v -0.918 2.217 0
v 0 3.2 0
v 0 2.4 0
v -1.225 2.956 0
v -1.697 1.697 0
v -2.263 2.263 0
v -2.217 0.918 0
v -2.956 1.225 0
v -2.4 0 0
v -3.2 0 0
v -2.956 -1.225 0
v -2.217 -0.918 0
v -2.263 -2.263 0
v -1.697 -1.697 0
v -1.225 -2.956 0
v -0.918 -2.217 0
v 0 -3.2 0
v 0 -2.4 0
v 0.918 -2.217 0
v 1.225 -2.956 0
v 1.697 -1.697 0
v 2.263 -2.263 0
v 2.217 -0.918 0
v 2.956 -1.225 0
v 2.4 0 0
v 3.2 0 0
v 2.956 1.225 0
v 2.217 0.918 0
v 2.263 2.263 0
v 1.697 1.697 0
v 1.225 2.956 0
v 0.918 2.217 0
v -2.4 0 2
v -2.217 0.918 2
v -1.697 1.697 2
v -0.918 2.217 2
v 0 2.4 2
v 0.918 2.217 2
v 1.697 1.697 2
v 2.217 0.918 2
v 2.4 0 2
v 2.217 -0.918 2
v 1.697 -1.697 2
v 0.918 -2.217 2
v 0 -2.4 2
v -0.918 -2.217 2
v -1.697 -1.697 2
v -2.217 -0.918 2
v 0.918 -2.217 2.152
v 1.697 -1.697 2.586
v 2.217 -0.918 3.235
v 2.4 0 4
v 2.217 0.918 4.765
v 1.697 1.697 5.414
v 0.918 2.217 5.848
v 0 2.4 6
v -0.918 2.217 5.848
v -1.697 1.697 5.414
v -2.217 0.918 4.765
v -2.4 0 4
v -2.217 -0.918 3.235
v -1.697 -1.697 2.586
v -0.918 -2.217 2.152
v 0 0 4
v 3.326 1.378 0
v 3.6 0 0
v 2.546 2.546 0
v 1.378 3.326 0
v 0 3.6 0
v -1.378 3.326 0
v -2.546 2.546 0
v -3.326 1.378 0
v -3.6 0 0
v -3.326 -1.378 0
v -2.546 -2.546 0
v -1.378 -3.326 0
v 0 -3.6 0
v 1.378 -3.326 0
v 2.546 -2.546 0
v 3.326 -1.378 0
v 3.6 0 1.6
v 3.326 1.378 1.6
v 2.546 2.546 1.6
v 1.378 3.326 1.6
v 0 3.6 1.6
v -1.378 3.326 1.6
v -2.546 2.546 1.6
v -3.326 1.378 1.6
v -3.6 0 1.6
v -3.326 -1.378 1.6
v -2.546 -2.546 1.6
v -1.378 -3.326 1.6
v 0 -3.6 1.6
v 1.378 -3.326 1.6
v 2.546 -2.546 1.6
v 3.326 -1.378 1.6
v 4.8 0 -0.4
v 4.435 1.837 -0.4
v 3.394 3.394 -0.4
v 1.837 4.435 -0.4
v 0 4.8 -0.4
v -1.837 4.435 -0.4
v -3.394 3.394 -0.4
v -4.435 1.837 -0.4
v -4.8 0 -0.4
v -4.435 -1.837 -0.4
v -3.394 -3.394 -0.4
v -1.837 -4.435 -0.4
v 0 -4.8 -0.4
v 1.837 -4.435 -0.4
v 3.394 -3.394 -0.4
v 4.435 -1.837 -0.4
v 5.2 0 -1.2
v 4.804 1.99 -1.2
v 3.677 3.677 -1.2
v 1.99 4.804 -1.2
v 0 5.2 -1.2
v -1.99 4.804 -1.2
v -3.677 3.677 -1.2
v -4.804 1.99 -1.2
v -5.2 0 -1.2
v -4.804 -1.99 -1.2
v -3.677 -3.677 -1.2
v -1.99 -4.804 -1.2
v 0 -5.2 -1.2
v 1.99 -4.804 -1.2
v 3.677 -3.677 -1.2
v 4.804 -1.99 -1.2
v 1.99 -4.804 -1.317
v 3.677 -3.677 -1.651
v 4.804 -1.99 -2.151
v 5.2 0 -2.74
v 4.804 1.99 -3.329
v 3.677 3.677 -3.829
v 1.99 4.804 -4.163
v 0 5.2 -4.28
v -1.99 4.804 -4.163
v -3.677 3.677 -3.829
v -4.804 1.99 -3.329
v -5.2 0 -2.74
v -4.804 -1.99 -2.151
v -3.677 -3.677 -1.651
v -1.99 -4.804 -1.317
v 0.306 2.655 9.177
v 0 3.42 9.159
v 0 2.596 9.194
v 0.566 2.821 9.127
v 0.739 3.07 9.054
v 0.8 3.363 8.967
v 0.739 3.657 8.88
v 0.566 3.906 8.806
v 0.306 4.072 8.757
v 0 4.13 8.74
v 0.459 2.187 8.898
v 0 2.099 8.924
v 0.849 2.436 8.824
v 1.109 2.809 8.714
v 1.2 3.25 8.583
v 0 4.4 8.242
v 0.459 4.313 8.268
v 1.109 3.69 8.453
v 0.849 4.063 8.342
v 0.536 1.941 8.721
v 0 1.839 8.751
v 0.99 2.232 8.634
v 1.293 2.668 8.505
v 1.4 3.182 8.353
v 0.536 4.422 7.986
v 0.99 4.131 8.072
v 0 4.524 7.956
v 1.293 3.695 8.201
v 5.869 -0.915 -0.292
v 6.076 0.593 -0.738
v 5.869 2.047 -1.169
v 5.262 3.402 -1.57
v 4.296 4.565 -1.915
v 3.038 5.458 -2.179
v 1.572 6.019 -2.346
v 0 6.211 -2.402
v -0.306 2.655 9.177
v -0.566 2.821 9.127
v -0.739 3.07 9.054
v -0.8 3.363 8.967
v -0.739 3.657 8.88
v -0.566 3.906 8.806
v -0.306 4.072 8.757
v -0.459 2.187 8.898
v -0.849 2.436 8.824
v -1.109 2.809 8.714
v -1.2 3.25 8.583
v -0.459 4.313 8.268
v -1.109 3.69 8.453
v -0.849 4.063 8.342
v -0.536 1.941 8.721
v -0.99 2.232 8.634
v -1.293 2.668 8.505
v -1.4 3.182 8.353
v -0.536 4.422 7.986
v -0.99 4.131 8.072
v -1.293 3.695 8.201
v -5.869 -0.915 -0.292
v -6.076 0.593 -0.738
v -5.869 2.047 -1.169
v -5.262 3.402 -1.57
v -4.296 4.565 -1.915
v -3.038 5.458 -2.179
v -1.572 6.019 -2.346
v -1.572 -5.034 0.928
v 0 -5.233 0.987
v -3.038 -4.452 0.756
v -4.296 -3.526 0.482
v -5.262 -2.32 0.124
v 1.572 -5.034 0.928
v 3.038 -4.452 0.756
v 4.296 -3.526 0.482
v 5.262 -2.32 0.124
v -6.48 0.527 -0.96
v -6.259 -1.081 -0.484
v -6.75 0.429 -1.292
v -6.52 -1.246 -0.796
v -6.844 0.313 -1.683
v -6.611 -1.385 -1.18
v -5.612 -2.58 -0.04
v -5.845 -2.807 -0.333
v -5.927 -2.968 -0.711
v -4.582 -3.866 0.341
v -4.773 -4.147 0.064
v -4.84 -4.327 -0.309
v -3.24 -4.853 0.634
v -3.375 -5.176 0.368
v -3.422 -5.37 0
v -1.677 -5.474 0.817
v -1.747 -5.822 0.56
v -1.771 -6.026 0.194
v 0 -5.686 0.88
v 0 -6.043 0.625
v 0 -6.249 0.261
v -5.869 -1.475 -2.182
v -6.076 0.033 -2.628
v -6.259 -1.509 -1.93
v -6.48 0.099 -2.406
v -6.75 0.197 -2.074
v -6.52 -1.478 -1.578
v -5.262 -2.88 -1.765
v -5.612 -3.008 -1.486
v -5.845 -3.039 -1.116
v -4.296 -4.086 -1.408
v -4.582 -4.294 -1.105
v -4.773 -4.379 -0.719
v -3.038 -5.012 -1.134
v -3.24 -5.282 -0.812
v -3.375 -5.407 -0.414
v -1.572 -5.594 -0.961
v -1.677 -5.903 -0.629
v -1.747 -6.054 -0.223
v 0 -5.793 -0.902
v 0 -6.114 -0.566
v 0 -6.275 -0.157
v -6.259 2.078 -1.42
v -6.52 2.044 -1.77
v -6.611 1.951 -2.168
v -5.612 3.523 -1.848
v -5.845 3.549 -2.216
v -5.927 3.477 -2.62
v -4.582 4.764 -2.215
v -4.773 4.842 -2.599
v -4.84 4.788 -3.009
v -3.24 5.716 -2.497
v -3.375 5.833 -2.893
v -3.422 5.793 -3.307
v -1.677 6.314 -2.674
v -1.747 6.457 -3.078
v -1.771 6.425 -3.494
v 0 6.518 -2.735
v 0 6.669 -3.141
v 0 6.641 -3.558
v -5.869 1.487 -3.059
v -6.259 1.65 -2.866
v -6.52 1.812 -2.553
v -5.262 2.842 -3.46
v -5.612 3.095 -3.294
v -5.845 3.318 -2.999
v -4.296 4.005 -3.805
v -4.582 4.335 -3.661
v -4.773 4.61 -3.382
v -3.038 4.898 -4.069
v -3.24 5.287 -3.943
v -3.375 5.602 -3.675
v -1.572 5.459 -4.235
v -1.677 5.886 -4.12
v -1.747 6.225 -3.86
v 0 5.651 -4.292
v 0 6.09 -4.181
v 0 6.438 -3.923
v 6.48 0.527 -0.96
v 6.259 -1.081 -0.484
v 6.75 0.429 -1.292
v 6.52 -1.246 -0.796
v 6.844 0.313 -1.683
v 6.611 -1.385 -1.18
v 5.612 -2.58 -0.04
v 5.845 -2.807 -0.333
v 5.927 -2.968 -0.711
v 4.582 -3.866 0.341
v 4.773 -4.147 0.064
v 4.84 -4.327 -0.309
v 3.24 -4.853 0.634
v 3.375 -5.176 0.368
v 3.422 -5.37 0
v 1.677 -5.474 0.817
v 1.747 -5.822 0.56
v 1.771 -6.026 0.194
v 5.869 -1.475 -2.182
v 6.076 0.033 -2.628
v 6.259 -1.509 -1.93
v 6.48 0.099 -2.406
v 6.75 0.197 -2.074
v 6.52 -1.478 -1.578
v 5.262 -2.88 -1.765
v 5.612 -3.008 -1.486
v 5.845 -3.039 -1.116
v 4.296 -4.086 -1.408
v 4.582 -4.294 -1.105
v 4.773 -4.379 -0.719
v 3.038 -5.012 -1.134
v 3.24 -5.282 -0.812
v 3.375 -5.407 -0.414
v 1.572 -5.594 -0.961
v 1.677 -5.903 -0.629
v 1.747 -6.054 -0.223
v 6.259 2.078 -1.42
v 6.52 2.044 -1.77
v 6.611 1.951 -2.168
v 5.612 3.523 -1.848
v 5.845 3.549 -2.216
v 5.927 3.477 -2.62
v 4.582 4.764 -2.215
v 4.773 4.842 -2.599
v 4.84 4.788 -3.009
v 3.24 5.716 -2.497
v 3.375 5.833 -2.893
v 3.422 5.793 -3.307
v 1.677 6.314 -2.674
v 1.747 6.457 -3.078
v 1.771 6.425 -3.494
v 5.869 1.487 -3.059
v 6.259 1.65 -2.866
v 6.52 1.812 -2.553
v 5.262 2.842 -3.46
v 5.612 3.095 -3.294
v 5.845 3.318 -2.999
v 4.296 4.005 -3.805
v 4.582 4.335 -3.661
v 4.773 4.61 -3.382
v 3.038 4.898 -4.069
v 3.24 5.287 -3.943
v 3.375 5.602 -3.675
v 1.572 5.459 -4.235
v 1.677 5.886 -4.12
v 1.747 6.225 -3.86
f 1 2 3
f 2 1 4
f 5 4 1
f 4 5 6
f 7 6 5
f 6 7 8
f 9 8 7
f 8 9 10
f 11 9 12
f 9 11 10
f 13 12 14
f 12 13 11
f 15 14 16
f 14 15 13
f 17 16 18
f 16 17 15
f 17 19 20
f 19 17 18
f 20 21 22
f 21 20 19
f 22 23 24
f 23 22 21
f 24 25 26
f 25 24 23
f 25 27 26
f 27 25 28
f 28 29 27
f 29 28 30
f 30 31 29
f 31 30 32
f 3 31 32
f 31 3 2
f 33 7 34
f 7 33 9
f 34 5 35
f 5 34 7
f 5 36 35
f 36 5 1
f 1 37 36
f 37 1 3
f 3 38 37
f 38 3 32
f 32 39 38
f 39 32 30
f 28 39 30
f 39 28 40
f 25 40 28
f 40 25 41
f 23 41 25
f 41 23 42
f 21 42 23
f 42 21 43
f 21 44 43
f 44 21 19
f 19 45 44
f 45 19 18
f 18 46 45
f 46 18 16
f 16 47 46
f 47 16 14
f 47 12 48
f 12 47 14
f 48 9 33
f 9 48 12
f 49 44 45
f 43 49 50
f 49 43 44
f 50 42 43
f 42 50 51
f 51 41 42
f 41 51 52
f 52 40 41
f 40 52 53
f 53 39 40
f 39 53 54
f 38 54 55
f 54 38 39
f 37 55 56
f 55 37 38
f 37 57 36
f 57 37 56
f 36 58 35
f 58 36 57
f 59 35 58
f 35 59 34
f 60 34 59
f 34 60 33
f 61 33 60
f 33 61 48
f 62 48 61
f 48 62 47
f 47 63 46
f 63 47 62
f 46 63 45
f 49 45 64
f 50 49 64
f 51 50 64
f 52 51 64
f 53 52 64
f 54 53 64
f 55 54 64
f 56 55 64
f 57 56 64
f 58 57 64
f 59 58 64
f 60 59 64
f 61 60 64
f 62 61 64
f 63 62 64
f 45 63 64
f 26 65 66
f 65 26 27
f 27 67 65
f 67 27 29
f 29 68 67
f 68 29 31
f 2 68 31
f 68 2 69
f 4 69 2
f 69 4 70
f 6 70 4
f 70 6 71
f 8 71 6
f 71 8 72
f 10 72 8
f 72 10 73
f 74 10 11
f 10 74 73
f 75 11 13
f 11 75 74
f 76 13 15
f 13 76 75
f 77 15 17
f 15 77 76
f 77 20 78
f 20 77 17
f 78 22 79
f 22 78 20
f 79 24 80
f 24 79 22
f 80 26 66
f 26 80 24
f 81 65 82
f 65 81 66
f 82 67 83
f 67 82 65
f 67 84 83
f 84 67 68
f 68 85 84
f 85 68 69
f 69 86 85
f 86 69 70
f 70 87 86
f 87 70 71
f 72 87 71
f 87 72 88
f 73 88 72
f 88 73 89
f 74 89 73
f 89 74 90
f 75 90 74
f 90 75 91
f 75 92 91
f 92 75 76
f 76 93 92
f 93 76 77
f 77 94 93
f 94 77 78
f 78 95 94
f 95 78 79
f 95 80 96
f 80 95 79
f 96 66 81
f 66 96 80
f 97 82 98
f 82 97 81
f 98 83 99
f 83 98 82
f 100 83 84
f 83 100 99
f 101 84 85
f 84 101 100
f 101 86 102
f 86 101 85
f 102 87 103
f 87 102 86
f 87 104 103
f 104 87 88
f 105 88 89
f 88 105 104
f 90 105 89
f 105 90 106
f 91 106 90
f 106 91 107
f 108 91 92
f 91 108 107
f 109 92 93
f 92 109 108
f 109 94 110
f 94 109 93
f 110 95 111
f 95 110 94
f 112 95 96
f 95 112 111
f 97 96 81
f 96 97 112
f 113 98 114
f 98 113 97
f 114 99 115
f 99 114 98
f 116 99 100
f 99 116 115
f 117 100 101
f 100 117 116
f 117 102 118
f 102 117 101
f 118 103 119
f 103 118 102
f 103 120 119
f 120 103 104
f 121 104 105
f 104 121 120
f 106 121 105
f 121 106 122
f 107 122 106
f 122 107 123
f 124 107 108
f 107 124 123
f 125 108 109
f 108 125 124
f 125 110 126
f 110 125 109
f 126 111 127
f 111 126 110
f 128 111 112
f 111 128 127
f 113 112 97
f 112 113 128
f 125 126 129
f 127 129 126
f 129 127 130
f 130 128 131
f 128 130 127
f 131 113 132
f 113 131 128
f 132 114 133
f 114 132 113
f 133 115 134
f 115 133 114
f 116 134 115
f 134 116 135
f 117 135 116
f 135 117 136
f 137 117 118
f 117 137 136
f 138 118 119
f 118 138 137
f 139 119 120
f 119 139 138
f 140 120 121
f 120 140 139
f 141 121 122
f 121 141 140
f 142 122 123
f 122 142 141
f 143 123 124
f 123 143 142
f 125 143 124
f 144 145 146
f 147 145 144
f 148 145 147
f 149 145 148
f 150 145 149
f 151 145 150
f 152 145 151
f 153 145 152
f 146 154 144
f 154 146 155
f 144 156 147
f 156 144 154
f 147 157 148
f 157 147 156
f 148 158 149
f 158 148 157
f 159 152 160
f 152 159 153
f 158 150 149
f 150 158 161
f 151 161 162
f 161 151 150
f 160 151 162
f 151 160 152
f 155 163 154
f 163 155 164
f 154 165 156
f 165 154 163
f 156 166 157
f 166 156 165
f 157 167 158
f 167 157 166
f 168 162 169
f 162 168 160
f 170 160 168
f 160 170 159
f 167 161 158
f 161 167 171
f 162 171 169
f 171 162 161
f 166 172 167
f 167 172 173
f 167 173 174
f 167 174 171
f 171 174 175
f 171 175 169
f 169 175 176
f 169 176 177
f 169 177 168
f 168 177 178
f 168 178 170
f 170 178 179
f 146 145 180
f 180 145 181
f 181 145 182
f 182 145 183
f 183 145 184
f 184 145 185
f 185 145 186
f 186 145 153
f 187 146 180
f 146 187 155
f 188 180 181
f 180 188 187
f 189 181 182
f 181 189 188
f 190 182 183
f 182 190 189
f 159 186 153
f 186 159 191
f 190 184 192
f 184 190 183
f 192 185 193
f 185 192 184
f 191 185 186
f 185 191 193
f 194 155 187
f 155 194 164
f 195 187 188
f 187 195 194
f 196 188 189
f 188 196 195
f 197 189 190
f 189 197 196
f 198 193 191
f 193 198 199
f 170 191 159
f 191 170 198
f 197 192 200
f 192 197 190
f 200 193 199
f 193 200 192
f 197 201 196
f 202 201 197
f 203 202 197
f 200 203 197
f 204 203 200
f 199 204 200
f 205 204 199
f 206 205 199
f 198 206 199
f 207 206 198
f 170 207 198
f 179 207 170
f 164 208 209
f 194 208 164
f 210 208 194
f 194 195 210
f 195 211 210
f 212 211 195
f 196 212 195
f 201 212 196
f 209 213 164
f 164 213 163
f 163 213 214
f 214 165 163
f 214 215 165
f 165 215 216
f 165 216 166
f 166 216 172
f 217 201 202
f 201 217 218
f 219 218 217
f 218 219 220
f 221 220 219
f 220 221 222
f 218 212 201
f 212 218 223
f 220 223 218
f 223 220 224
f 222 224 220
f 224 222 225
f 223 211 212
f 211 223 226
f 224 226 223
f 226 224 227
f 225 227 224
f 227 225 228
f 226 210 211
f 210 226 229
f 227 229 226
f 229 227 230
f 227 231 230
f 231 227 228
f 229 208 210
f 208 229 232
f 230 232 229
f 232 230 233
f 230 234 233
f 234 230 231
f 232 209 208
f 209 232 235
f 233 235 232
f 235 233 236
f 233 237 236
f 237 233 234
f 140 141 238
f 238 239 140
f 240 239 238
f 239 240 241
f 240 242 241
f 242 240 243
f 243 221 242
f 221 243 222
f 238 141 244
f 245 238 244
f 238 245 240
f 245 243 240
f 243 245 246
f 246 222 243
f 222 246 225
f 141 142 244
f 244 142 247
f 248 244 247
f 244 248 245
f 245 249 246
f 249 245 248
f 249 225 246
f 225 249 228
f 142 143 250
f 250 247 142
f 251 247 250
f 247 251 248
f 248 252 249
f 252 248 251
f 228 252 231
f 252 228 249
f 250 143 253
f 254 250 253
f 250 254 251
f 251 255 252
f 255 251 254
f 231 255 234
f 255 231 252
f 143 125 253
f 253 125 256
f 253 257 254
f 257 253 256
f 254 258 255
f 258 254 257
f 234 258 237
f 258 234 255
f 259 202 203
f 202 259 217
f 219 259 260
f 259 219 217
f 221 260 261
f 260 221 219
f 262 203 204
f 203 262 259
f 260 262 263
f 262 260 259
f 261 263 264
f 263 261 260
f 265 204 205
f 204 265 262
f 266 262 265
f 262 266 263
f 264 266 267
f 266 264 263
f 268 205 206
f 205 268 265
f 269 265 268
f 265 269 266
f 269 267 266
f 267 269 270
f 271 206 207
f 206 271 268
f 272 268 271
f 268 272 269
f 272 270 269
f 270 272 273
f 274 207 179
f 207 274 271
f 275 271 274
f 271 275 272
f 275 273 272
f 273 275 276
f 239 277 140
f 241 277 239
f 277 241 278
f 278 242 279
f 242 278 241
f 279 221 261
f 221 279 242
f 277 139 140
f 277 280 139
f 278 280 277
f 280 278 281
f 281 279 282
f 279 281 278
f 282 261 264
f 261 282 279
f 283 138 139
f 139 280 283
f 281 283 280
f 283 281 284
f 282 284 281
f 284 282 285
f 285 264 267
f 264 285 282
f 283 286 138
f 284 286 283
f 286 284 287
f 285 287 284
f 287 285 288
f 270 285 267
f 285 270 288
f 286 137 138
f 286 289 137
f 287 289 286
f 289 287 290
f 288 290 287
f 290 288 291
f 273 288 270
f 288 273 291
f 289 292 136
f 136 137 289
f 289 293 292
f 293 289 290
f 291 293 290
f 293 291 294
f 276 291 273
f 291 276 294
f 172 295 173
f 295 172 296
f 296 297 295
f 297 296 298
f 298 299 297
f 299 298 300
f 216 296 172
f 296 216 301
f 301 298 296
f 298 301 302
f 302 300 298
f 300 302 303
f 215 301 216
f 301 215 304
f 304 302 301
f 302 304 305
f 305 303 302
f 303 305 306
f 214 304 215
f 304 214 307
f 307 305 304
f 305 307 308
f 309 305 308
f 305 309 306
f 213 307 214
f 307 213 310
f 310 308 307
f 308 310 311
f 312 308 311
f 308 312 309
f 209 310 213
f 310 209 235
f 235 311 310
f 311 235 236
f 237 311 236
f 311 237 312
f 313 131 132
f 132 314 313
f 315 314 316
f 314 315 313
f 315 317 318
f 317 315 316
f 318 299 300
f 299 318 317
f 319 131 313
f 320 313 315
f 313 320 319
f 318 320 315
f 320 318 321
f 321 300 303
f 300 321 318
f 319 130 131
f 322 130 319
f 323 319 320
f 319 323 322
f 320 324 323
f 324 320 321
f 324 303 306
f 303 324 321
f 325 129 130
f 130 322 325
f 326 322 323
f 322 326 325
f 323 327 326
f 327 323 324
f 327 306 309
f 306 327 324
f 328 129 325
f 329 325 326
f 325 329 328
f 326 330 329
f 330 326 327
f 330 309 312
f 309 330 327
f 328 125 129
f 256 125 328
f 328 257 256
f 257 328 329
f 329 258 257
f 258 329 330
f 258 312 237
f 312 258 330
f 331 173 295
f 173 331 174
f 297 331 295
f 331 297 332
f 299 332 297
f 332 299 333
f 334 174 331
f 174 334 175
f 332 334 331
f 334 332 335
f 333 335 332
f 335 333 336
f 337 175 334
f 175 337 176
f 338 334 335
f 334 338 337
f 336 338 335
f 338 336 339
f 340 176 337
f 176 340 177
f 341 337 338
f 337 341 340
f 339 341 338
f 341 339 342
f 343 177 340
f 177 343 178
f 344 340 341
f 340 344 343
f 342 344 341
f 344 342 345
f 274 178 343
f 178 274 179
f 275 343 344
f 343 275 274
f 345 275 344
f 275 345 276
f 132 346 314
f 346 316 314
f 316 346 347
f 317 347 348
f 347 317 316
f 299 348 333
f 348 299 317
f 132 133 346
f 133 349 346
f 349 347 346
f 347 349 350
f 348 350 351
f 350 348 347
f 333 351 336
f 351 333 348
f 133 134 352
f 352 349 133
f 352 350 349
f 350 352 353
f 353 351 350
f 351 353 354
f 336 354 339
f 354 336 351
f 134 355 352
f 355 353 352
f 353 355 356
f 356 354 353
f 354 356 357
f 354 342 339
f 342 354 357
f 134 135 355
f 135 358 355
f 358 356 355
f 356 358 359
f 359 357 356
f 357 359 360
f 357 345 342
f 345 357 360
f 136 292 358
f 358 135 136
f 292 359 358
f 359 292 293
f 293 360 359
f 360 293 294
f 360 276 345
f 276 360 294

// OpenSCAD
use <../lib.scad>
use <s/12894s01.scad>
use <s/12894s03.scad>
use <s/12894s04.scad>
function ldraw_lib__12894() = [
// 0 Minifig Hat Cone
// 0 Name: 12894.dat
// 0 Author: Gerald Lasser [GeraldLasser]
// 0 !LDRAW_ORG Part UPDATE 2026-01
// 0 !LICENSE Licensed under CC BY 4.0 : see CAreadme.txt
// 
// 0 BFC CERTIFY CCW
  [0,"BFC","CERTIFY"],
  [0,"BFC","CCW"],
// 
// 0 !CATEGORY Minifig Headwear
// 
// 0 !HISTORY 2013-08-14 {LEGO Digital Designer} Original part shape
// 0 !HISTORY 2023-12-27 [GeraldLasser] File preparation for LDraw Parts Tracker
// 0 !HISTORY 2026-01-29 [OrionP] Official Update 2026-01
// 
// 1 16 0 0 0 1 0 0 0 1 0 0 0 1 s\12894s01.dat
  [1,16,0,0,0,1,0,0,0,1,0,0,0,1, ldraw_lib__s__12894s01()],
// 
// 1 16 0 0 0 -1 0 0 0 1 0 0 0 1 s\12894s03.dat
  [1,16,0,0,0,-1,0,0,0,1,0,0,0,1, ldraw_lib__s__12894s03()],
// 1 16 0 0 0 1 0 0 0 1 0 0 0 1 s\12894s03.dat
  [1,16,0,0,0,1,0,0,0,1,0,0,0,1, ldraw_lib__s__12894s03()],
// 1 16 0 0 0 -1 0 0 0 1 0 0 0 1 s\12894s04.dat
  [1,16,0,0,0,-1,0,0,0,1,0,0,0,1, ldraw_lib__s__12894s04()],
// 1 16 0 0 0 1 0 0 0 1 0 0 0 1 s\12894s04.dat
  [1,16,0,0,0,1,0,0,0,1,0,0,0,1, ldraw_lib__s__12894s04()],
];
module ldraw_lib__12894(step=0, col=false, unit=2/5, alt=false, line=0.2, solid=!$preview)
    makepoly(ldraw_lib__12894(), step=step, col=col, unit=unit, alt=alt, line=line, solid=solid);
ldraw_lib__12894(line=0.2);
